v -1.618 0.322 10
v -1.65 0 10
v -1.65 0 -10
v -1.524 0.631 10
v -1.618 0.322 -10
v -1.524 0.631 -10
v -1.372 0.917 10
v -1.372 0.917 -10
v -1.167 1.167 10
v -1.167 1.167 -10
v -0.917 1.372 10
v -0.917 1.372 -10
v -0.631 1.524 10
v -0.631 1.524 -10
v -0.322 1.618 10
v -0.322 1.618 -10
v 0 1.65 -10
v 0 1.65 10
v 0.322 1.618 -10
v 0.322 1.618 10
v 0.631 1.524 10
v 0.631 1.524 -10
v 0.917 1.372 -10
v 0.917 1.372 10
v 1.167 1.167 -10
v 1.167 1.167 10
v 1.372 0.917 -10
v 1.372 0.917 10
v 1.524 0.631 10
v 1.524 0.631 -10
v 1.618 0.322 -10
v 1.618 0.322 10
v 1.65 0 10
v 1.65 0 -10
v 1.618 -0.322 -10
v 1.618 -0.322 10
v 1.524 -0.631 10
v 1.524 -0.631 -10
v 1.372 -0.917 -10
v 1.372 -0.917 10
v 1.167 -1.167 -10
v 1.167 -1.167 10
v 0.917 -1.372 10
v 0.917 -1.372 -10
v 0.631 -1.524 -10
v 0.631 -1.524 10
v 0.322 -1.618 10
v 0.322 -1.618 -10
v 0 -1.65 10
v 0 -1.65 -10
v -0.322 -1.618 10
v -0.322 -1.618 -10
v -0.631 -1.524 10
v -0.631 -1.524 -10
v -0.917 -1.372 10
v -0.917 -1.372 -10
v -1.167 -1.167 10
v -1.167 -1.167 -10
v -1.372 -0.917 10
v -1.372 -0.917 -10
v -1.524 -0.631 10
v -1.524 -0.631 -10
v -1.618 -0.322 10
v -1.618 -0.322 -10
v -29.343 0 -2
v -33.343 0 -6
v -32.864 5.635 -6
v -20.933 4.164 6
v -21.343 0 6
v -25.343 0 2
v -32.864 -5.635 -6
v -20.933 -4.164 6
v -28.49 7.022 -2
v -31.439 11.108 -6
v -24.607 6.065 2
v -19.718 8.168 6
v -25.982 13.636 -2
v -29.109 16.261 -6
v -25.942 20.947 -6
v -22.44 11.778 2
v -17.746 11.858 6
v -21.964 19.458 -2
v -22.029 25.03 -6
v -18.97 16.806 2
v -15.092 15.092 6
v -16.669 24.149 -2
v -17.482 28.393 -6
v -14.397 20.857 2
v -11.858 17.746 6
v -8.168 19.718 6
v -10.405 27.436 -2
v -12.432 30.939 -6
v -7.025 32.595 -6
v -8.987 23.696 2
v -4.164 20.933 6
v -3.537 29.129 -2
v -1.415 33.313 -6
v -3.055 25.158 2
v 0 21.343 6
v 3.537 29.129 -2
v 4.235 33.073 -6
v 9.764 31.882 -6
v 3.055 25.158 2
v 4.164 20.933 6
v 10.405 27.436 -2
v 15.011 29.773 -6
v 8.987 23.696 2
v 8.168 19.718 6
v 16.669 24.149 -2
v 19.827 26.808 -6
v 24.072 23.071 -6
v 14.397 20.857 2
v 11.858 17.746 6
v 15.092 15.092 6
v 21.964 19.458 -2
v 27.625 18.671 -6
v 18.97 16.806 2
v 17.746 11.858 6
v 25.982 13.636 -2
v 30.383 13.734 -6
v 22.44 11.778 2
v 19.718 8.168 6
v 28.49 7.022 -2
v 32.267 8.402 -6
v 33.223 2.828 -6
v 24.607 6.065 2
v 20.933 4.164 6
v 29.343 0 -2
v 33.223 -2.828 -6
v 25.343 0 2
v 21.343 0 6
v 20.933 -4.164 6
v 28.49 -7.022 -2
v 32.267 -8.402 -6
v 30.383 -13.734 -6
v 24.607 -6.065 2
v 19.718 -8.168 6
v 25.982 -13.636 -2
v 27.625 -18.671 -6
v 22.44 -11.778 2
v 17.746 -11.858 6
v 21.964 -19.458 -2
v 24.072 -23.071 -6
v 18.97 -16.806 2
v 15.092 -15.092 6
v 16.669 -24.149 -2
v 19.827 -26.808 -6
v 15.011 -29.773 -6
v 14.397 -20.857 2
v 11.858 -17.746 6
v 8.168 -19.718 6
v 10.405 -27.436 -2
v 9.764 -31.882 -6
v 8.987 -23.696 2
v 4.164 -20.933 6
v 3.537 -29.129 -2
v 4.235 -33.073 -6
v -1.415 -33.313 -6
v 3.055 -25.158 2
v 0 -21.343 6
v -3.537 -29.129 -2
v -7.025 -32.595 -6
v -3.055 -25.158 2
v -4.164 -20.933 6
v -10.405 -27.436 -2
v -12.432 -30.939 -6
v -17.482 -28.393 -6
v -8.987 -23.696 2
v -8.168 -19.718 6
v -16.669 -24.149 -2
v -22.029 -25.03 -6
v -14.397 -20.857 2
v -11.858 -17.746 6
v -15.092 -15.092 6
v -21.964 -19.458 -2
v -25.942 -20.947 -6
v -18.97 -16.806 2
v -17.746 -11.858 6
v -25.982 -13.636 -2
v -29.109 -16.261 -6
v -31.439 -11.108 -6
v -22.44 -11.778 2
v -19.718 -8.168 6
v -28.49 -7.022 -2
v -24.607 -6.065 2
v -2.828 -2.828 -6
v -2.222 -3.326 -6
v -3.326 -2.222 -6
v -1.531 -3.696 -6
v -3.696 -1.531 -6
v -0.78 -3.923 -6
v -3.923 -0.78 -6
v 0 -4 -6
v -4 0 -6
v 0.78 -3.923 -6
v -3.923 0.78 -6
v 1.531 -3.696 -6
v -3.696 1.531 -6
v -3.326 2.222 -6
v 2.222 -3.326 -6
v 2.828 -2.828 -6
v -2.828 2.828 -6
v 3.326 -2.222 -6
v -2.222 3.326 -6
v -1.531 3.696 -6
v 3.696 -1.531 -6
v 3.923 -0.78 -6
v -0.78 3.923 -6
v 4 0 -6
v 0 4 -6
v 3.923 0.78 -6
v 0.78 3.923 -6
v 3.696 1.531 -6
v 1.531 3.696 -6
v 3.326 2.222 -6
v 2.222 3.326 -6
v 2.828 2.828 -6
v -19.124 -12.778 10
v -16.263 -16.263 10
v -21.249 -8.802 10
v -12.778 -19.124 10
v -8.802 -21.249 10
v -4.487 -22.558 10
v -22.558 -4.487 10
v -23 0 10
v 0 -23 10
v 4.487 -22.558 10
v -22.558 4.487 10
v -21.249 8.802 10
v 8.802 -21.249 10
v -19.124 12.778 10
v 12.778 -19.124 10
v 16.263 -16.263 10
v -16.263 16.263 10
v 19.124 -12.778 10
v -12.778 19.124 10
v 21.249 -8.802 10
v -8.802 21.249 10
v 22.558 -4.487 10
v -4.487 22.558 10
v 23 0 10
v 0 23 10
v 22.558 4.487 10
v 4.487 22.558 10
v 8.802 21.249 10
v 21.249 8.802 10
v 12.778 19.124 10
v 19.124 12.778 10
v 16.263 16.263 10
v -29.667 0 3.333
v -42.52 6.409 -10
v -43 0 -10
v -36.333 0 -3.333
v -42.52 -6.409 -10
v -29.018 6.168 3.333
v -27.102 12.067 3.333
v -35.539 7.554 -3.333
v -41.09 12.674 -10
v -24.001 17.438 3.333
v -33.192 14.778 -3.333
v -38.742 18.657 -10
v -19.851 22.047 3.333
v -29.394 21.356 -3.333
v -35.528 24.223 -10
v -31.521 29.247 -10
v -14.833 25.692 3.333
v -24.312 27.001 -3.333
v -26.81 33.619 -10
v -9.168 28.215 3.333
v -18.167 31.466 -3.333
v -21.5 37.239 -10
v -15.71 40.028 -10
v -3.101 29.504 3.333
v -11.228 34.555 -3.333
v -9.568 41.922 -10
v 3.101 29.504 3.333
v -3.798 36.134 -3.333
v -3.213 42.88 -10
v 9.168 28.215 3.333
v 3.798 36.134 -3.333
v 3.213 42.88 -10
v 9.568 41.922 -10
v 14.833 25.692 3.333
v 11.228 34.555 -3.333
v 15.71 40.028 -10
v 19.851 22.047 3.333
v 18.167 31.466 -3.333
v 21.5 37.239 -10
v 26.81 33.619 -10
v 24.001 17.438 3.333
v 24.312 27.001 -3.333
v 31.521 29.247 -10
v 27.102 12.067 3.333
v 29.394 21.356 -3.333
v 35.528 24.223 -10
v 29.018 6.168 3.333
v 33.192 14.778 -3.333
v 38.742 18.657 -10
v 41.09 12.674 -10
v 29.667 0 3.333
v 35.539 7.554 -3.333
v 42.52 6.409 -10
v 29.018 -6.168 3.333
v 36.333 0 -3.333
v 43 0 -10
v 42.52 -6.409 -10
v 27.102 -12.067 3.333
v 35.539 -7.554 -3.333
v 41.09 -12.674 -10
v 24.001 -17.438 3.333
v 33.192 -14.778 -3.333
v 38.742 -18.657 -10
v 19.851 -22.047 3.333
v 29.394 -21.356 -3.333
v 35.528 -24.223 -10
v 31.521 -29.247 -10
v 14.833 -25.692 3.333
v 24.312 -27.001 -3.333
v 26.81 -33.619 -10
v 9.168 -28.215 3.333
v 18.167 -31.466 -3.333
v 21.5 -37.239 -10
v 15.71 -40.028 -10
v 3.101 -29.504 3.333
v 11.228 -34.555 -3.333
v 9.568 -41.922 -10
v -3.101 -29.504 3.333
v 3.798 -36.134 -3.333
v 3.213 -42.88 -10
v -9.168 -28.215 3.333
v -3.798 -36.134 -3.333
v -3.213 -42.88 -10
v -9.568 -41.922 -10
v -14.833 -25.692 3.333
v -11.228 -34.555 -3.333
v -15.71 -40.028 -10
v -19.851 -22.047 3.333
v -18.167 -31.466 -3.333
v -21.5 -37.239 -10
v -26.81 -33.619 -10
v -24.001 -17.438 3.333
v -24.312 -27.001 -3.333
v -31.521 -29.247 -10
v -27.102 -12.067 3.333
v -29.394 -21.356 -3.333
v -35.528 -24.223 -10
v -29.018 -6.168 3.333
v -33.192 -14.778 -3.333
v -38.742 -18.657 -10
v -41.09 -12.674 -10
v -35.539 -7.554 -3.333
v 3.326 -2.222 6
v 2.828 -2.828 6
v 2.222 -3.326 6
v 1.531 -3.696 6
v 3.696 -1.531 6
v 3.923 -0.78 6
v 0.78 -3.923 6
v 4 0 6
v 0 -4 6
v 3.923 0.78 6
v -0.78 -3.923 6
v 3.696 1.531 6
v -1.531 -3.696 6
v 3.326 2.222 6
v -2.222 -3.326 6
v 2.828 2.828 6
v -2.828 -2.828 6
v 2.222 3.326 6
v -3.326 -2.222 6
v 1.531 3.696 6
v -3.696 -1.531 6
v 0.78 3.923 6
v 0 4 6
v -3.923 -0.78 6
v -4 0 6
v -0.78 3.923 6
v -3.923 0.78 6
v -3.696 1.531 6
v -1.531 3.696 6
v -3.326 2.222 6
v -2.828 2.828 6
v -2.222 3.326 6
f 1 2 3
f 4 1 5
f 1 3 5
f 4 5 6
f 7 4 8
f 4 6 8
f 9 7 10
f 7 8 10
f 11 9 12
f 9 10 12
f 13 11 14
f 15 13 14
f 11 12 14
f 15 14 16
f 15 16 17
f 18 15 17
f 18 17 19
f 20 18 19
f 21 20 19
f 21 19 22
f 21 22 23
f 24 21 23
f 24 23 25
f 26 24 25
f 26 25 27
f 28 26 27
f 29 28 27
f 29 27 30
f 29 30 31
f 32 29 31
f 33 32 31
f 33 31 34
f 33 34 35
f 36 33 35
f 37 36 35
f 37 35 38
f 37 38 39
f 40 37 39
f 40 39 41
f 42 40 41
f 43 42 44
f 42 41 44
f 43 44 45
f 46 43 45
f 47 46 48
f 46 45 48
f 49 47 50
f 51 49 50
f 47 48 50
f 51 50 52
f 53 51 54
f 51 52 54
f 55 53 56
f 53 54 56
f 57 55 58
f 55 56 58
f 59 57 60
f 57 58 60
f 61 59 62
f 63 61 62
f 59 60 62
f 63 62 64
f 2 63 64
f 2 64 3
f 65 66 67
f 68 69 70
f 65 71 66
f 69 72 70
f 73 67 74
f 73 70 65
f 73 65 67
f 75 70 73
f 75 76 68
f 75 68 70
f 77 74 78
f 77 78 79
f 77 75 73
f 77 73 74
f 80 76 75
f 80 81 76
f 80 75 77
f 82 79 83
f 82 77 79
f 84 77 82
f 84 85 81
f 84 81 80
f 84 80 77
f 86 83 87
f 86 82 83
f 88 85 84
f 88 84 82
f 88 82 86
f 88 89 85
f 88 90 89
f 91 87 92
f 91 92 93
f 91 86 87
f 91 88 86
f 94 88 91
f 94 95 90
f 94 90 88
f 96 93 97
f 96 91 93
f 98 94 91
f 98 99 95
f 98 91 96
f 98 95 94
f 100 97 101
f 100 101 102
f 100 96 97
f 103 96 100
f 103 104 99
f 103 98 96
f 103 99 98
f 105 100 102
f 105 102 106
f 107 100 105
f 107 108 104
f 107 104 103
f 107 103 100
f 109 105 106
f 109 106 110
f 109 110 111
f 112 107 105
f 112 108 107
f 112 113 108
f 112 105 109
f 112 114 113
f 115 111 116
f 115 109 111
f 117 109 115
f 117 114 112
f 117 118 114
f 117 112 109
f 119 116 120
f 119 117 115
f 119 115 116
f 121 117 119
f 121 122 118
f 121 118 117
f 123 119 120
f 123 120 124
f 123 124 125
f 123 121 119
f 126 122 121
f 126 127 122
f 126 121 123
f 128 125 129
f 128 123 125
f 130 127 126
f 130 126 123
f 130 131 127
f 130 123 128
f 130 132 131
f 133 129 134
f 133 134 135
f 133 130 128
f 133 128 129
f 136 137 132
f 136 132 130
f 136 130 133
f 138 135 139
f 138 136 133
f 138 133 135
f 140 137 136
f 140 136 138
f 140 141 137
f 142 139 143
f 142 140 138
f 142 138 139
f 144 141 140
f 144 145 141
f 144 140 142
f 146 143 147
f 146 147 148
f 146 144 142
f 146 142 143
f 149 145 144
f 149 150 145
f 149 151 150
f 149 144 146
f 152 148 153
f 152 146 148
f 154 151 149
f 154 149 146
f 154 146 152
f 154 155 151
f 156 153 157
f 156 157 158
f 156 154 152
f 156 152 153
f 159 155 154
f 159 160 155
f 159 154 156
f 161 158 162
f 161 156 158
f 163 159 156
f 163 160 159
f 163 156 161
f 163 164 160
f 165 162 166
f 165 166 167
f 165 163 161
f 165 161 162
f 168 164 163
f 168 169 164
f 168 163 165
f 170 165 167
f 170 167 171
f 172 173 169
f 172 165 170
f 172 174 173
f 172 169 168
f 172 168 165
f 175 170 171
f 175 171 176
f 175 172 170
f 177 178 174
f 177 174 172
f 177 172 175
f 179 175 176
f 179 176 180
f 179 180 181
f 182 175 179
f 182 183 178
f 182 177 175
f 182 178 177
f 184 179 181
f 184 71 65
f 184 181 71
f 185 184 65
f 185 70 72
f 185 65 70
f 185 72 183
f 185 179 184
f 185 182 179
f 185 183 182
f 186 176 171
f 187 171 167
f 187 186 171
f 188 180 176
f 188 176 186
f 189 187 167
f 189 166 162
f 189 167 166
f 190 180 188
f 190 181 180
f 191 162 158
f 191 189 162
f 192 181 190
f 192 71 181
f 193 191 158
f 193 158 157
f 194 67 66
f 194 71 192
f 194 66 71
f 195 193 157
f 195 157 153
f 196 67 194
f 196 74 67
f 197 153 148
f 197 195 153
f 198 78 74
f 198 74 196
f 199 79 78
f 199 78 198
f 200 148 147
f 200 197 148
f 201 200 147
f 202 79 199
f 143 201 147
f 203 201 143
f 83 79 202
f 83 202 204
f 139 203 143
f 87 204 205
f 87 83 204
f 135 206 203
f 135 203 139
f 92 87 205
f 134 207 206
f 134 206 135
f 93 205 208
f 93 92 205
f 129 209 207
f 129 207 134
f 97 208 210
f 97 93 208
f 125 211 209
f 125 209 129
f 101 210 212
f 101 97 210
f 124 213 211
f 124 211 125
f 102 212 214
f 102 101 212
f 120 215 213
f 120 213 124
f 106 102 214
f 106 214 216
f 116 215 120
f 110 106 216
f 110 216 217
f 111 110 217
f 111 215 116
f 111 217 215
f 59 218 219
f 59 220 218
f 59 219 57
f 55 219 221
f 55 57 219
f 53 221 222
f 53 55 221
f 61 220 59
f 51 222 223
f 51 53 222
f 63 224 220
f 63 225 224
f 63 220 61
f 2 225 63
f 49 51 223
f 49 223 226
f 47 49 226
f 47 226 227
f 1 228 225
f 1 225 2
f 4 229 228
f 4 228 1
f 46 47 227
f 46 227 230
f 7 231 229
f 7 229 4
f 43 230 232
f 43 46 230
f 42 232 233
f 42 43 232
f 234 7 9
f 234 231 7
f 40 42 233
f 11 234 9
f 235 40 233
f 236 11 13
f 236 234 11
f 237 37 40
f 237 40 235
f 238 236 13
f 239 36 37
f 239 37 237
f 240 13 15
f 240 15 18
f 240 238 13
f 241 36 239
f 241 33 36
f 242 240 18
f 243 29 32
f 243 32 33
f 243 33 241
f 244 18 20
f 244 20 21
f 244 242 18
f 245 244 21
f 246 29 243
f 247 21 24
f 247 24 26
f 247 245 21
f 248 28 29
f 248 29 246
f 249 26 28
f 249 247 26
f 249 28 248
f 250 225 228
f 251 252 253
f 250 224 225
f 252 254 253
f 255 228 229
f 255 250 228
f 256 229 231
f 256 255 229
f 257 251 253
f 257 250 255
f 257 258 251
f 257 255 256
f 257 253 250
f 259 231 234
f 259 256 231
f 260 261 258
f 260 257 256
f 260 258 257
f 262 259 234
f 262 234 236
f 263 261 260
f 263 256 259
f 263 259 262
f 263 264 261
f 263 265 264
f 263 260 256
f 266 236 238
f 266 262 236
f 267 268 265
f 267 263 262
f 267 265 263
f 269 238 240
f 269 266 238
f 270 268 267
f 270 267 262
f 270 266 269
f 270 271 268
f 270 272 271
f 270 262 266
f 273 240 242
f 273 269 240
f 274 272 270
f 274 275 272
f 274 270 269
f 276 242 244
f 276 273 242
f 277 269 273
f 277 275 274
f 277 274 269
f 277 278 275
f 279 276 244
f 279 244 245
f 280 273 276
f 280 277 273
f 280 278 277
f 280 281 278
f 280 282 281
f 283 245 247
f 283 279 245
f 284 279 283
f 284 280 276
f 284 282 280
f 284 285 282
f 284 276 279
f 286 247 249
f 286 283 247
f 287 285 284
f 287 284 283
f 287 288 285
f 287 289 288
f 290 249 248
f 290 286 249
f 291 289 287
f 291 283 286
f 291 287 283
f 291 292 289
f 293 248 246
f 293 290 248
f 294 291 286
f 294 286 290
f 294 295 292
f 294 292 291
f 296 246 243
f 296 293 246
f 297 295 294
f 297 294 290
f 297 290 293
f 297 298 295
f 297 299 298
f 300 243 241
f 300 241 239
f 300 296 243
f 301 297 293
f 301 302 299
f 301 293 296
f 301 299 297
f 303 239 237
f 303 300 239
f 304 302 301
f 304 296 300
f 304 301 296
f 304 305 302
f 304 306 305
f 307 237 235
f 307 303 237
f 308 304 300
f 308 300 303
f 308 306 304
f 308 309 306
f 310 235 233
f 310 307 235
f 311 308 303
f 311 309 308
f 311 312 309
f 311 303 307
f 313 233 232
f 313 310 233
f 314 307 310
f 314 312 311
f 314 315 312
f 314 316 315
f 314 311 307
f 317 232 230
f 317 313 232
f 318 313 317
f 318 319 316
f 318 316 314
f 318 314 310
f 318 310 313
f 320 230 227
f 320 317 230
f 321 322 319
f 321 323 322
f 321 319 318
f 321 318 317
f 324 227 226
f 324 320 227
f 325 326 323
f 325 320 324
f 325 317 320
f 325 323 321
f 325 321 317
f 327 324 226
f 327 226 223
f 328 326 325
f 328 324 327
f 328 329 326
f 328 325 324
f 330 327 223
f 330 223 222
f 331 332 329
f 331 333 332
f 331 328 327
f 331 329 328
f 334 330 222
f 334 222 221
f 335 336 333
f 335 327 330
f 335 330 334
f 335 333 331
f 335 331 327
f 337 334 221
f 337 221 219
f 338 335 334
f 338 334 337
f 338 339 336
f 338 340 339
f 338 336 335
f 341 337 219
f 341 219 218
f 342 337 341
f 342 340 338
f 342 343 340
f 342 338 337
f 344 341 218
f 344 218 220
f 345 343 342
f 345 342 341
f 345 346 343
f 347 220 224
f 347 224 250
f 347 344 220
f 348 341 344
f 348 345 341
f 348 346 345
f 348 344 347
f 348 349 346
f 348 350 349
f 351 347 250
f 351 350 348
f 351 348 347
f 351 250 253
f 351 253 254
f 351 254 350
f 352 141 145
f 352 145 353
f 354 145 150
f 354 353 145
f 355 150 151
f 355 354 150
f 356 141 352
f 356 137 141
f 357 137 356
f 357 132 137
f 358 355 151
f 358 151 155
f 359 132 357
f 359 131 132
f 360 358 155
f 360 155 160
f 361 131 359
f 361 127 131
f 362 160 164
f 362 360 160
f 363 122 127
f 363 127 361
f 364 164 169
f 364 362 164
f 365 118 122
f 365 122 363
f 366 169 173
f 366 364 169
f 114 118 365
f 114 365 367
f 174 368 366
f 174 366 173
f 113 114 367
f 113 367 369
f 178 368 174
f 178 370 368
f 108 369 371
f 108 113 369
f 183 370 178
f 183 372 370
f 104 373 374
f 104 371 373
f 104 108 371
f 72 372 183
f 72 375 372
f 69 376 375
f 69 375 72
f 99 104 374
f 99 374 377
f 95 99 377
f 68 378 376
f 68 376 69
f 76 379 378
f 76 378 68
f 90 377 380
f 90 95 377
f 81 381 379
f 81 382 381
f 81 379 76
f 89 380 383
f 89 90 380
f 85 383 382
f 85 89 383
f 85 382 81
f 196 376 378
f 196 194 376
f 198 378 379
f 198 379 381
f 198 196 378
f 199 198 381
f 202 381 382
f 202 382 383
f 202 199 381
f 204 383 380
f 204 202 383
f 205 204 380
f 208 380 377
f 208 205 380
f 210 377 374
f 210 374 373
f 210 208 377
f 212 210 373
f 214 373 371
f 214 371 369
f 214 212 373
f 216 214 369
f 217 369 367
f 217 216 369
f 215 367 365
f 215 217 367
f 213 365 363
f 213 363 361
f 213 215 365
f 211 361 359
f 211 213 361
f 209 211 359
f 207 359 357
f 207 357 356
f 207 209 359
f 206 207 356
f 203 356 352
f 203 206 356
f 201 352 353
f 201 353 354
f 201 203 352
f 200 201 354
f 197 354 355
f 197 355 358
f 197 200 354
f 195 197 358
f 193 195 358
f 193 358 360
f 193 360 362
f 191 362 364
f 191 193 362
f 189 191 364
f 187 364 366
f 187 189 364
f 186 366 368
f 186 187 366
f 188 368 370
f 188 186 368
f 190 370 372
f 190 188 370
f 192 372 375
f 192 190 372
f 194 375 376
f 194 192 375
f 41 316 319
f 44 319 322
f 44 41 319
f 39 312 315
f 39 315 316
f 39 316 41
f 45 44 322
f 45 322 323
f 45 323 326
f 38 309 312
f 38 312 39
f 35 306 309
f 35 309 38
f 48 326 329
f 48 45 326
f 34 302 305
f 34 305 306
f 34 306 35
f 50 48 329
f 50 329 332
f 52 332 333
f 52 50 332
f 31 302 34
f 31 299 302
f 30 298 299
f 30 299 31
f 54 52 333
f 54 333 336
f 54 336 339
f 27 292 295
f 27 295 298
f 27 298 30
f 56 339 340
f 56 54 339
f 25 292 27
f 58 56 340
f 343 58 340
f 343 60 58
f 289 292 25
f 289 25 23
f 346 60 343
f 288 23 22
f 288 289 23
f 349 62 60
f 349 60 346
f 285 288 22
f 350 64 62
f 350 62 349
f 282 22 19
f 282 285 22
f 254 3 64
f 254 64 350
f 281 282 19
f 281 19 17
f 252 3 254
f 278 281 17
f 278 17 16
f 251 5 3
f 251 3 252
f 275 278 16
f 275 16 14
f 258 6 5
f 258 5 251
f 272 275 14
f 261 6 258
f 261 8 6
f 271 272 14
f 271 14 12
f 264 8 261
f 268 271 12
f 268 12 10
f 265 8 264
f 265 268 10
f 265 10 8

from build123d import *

# Parameters (mm, degrees)
F3_D = 3.3


with BuildPart() as f1:
    # F0 (on Front) → F1 (revolve)
    with BuildSketch(Plane.XZ):
        Polygon((0, 10), (-23, 10), (-43, -10), (0, -10), align=None)
        Polygon((-33.3431457505, -6), (-21.3431457505, 6), (-4, 6), (-4, -6), align=None, mode=Mode.SUBTRACT)
    revolve(axis=Axis((0, 0, 0), (0, 0, -1)))

    # F3 (through all)
    with Locations(Plane.XY.offset(10)):
        with Locations((0, 0)):
            Hole(F3_D / 2)


solid = f1.part
